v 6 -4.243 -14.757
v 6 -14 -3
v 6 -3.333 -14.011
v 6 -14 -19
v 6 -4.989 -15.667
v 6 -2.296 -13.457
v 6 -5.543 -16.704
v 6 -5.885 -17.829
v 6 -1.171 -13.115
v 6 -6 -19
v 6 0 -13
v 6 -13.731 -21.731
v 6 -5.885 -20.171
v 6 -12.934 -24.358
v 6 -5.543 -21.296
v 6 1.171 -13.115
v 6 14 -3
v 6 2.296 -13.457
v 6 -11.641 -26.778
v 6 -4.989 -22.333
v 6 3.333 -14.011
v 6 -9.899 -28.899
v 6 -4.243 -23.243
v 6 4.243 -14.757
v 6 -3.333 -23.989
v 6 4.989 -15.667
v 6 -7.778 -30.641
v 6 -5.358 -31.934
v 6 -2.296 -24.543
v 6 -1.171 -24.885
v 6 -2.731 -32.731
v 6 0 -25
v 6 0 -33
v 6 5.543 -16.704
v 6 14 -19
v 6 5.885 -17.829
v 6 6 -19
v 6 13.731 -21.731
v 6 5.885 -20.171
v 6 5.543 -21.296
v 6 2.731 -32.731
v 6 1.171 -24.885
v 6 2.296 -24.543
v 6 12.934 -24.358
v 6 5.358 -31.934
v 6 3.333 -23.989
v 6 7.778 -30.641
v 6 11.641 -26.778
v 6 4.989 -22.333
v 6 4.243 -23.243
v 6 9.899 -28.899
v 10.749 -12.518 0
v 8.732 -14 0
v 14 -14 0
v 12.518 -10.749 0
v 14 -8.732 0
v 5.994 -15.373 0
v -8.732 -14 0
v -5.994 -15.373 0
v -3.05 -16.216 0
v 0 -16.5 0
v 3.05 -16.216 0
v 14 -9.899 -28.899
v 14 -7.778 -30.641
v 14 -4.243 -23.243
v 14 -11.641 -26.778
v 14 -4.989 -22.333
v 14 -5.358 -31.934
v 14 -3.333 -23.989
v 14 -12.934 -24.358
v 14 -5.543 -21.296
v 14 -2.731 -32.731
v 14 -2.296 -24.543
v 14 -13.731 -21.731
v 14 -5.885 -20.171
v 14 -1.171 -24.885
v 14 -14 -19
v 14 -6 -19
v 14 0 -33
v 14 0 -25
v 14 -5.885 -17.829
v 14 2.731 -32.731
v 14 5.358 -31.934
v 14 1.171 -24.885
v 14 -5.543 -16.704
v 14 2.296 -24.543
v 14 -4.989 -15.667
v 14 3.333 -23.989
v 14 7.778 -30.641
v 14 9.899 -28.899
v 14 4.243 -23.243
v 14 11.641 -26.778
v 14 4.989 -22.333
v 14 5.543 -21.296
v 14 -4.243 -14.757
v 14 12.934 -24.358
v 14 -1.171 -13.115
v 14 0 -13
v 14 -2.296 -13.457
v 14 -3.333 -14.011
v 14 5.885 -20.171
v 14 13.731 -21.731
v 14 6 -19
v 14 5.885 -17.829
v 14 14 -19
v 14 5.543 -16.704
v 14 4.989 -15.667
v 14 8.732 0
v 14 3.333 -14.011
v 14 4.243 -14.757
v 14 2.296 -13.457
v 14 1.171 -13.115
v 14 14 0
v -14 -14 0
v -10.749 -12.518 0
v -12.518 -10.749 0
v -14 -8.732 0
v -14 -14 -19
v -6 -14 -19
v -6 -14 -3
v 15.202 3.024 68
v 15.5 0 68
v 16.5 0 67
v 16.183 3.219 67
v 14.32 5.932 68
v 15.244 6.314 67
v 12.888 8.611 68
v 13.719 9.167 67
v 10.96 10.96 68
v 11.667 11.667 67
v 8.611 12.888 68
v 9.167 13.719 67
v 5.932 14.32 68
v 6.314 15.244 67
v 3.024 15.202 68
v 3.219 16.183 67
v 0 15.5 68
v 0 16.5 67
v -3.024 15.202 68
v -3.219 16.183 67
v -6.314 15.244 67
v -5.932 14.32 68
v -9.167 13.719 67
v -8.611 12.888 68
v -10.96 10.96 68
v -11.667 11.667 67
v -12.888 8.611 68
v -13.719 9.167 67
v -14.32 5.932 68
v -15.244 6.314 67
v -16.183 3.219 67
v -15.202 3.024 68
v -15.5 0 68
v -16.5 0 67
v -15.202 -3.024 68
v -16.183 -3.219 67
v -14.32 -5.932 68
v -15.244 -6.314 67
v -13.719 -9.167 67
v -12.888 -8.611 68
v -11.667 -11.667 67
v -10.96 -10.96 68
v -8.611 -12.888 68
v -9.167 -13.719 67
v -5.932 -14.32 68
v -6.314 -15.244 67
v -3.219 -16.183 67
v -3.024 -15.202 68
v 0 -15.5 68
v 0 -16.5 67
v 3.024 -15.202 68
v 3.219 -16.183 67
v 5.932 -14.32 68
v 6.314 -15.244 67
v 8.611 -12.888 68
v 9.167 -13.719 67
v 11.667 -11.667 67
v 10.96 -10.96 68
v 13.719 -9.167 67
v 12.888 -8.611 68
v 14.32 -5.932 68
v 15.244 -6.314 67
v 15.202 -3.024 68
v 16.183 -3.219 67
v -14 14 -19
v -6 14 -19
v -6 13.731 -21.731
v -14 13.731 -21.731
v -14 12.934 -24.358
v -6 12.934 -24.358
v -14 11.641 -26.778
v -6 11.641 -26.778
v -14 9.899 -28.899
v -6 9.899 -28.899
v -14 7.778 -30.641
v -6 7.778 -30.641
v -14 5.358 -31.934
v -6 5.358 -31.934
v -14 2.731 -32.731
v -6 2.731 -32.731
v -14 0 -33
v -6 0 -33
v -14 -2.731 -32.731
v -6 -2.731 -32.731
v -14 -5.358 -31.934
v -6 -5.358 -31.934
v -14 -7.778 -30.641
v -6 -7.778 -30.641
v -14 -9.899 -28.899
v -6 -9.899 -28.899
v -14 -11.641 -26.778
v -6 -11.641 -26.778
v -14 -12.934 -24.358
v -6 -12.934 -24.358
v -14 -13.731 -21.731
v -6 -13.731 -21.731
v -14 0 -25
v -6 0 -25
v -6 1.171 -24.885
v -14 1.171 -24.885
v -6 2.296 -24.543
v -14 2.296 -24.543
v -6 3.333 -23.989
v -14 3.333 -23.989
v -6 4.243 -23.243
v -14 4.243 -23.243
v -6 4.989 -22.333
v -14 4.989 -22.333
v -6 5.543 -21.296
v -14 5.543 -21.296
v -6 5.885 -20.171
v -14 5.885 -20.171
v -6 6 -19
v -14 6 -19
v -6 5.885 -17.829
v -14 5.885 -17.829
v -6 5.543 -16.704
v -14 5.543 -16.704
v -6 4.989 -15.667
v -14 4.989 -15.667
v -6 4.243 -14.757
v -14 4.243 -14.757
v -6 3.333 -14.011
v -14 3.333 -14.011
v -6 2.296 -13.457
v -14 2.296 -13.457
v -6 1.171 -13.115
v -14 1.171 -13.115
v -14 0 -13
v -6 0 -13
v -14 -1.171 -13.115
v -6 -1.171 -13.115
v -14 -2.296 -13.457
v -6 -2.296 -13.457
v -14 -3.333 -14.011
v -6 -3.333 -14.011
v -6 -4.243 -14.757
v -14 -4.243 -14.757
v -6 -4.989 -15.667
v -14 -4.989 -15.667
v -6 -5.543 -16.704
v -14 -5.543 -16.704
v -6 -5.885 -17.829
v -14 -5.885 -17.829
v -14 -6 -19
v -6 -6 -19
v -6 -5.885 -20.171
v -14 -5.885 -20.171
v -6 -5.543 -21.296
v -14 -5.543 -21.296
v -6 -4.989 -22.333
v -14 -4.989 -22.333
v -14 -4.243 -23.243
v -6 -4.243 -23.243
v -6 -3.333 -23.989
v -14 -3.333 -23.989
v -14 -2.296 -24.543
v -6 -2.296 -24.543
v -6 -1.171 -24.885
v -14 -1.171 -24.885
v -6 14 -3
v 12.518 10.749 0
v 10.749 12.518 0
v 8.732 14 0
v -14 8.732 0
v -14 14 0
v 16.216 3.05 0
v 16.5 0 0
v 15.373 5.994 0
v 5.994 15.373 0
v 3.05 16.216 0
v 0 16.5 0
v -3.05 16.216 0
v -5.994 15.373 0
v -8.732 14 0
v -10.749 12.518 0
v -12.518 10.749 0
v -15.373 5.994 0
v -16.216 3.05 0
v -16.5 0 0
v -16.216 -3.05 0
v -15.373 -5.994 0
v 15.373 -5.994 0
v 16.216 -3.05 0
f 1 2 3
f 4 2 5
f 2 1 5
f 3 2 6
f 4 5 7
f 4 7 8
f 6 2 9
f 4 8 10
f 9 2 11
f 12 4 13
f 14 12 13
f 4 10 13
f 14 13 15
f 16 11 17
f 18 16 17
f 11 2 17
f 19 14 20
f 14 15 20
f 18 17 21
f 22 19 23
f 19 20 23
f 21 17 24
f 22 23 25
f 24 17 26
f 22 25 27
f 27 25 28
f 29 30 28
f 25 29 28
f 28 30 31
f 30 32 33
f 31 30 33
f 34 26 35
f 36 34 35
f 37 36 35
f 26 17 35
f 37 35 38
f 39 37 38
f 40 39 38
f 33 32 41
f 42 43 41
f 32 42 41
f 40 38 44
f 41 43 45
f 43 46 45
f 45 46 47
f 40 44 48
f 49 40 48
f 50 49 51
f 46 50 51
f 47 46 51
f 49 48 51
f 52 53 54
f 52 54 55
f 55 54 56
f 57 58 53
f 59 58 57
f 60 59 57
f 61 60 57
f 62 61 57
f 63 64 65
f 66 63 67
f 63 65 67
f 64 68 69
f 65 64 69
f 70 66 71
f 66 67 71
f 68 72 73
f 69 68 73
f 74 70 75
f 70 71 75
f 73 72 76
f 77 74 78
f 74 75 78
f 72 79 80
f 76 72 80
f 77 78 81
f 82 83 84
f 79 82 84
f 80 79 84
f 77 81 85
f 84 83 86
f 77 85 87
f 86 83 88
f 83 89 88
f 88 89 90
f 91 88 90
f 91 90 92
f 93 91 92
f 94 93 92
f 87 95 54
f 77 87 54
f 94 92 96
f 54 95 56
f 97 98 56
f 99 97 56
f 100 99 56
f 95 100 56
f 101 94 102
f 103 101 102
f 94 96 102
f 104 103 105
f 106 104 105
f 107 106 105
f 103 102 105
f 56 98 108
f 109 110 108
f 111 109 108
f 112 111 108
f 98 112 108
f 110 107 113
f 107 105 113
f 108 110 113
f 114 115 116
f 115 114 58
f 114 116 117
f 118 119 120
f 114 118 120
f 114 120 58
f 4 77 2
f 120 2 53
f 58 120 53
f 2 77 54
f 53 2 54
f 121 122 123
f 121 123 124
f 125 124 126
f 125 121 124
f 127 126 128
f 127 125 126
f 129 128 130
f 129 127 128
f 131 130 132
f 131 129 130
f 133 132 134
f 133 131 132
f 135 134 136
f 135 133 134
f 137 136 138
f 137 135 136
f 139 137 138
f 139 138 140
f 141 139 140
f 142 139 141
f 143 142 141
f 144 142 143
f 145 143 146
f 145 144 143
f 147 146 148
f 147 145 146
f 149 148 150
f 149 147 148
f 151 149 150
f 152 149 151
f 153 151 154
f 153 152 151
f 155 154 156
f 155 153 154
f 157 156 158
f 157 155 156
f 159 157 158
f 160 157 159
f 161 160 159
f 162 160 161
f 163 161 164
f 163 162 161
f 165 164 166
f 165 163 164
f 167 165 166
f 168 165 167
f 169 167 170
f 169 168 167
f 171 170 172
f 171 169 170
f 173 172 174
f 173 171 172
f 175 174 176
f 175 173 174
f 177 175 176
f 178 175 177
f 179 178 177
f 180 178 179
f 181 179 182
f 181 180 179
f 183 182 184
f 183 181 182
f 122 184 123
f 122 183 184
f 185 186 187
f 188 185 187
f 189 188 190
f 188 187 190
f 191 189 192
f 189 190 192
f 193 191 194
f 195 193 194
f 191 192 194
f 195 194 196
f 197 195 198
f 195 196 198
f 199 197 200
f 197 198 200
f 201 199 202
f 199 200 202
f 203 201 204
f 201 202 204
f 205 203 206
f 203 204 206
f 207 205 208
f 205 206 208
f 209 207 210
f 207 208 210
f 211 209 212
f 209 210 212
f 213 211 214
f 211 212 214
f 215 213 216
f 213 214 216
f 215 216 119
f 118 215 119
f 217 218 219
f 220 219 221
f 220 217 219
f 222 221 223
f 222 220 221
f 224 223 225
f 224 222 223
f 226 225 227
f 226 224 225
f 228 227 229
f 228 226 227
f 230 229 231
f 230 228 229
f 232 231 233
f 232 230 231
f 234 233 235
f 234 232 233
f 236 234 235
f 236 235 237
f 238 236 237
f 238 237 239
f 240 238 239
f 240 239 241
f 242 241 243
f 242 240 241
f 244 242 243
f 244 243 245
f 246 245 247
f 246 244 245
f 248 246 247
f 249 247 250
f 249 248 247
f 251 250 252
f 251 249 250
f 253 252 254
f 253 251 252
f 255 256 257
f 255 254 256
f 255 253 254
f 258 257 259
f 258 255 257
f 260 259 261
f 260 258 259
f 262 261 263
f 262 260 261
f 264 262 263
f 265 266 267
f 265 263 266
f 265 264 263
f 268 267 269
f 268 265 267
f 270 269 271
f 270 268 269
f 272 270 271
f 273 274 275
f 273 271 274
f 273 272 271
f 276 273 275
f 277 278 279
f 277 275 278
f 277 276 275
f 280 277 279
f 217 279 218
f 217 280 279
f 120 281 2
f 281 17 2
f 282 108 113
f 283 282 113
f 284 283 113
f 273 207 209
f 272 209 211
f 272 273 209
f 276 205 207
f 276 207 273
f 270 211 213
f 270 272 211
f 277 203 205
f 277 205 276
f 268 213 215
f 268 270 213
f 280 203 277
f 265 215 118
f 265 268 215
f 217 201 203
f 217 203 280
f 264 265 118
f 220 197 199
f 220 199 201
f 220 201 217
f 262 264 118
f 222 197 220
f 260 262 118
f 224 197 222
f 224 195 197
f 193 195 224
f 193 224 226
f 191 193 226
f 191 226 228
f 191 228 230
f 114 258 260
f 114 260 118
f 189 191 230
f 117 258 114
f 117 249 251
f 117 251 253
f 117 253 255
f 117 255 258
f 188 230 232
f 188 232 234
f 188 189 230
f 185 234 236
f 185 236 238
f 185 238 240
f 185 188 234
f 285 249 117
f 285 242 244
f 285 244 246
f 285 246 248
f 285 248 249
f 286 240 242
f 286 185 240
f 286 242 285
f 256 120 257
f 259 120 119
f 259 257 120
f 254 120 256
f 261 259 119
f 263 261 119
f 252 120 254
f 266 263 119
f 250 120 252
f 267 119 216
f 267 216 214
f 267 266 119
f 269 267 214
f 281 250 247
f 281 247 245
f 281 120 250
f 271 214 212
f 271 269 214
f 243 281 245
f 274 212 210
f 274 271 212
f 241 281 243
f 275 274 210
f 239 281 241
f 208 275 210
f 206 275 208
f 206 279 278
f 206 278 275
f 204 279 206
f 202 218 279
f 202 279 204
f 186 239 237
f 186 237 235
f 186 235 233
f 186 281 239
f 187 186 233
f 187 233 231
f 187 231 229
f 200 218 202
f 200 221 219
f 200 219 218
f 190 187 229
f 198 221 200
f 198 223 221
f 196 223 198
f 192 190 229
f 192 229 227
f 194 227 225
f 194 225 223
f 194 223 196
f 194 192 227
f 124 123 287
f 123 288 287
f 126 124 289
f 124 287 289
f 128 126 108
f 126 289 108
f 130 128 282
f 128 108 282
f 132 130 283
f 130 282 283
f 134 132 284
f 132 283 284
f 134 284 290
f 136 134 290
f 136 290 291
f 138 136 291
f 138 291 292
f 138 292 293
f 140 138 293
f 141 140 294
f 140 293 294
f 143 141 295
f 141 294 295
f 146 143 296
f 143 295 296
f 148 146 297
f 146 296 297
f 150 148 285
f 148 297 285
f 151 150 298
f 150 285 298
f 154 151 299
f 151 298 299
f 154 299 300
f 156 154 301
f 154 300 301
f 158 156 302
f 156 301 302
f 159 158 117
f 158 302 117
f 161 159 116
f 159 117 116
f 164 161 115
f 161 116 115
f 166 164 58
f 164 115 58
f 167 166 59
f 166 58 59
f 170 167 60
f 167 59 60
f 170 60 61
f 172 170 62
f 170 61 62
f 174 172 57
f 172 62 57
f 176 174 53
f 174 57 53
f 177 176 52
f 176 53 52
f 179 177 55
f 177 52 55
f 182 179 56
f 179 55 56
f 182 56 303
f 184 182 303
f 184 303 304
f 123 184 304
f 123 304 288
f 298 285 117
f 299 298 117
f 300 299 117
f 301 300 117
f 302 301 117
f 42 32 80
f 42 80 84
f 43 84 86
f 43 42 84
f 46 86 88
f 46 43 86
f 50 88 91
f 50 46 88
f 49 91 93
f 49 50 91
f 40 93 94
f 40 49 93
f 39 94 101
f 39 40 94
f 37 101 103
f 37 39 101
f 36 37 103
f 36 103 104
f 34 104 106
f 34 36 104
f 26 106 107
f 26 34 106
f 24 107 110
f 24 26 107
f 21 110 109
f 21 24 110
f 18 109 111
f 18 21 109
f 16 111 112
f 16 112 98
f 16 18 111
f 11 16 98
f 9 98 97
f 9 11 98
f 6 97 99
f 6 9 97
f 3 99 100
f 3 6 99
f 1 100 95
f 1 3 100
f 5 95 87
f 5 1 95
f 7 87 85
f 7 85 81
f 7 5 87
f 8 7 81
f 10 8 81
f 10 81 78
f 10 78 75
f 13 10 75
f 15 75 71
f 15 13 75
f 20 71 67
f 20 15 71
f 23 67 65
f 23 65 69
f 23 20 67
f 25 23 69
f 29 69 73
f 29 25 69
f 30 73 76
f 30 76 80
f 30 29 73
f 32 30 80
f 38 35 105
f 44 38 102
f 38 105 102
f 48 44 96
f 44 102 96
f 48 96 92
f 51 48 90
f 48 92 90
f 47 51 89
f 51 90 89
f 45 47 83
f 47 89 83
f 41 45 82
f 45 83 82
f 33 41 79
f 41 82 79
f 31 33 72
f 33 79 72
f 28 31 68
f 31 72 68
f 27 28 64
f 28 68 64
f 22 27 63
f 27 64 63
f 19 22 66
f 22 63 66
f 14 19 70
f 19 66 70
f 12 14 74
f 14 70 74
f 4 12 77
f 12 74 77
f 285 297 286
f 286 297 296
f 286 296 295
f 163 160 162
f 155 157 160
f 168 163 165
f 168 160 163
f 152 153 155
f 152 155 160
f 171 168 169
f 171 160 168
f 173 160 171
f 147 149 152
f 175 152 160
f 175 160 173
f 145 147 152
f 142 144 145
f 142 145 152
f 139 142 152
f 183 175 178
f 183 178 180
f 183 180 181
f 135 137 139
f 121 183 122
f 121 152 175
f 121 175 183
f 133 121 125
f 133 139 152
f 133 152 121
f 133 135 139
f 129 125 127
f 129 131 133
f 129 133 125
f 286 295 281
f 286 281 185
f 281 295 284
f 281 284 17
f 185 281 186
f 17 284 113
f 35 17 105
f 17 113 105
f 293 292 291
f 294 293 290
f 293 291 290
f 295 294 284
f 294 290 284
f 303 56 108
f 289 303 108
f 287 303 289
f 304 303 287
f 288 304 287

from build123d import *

# Parameters (mm, degrees)
SKETCH_1_R          = 16.5
EXTRUDE_1_DEPTH     = 68
CHAMFER_1_SIZE      = 1
SKETCH_3_R          = 6
EXTRUDE_2_DEPTH     = 14
CUT_EXTRUDE_3_DEPTH = 6


with BuildPart() as part:
    # 草圖1 → 伸長1 (new body)
    with BuildSketch(Plane.XY):
        Circle(SKETCH_1_R)
    extrude(amount=EXTRUDE_1_DEPTH)

    # 導角1
    chamfer_1_edges = [part.edges().sort_by_distance(p)[0] for p in [
        (-16.5, 0, 68),
    ]]
    chamfer(chamfer_1_edges, length=CHAMFER_1_SIZE)

    # 草圖3 → 伸長2 (add, symmetric)
    with BuildSketch(Plane(origin=(0, 0, 0), x_dir=(0, 0, -1), z_dir=(1, 0, 0))):
        with BuildLine():
            Line((0, 14), (19, 14))
            ThreePointArc((19, 14), (33, 0), (19, -14))
            Line((19, -14), (0, -14))
            Line((0, -14), (0, 14))
        make_face()
        with Locations((19, 0)):
            Circle(SKETCH_3_R, mode=Mode.SUBTRACT)
    extrude(amount=EXTRUDE_2_DEPTH, both=True)

    # 草圖4 → 伸長3 (cut, symmetric)
    with BuildSketch(Plane(origin=(0, 0, 0), x_dir=(0, 0, -1), z_dir=(1, 0, 0))):
        with BuildLine():
            Line((3, 14), (3, -14))
            Line((3, -14), (19, -14))
            ThreePointArc((19, -14), (33, 0), (19, 14))
            Line((19, 14), (3, 14))
        make_face()
    extrude(amount=CUT_EXTRUDE_3_DEPTH, both=True, mode=Mode.SUBTRACT)


solid = part.part
